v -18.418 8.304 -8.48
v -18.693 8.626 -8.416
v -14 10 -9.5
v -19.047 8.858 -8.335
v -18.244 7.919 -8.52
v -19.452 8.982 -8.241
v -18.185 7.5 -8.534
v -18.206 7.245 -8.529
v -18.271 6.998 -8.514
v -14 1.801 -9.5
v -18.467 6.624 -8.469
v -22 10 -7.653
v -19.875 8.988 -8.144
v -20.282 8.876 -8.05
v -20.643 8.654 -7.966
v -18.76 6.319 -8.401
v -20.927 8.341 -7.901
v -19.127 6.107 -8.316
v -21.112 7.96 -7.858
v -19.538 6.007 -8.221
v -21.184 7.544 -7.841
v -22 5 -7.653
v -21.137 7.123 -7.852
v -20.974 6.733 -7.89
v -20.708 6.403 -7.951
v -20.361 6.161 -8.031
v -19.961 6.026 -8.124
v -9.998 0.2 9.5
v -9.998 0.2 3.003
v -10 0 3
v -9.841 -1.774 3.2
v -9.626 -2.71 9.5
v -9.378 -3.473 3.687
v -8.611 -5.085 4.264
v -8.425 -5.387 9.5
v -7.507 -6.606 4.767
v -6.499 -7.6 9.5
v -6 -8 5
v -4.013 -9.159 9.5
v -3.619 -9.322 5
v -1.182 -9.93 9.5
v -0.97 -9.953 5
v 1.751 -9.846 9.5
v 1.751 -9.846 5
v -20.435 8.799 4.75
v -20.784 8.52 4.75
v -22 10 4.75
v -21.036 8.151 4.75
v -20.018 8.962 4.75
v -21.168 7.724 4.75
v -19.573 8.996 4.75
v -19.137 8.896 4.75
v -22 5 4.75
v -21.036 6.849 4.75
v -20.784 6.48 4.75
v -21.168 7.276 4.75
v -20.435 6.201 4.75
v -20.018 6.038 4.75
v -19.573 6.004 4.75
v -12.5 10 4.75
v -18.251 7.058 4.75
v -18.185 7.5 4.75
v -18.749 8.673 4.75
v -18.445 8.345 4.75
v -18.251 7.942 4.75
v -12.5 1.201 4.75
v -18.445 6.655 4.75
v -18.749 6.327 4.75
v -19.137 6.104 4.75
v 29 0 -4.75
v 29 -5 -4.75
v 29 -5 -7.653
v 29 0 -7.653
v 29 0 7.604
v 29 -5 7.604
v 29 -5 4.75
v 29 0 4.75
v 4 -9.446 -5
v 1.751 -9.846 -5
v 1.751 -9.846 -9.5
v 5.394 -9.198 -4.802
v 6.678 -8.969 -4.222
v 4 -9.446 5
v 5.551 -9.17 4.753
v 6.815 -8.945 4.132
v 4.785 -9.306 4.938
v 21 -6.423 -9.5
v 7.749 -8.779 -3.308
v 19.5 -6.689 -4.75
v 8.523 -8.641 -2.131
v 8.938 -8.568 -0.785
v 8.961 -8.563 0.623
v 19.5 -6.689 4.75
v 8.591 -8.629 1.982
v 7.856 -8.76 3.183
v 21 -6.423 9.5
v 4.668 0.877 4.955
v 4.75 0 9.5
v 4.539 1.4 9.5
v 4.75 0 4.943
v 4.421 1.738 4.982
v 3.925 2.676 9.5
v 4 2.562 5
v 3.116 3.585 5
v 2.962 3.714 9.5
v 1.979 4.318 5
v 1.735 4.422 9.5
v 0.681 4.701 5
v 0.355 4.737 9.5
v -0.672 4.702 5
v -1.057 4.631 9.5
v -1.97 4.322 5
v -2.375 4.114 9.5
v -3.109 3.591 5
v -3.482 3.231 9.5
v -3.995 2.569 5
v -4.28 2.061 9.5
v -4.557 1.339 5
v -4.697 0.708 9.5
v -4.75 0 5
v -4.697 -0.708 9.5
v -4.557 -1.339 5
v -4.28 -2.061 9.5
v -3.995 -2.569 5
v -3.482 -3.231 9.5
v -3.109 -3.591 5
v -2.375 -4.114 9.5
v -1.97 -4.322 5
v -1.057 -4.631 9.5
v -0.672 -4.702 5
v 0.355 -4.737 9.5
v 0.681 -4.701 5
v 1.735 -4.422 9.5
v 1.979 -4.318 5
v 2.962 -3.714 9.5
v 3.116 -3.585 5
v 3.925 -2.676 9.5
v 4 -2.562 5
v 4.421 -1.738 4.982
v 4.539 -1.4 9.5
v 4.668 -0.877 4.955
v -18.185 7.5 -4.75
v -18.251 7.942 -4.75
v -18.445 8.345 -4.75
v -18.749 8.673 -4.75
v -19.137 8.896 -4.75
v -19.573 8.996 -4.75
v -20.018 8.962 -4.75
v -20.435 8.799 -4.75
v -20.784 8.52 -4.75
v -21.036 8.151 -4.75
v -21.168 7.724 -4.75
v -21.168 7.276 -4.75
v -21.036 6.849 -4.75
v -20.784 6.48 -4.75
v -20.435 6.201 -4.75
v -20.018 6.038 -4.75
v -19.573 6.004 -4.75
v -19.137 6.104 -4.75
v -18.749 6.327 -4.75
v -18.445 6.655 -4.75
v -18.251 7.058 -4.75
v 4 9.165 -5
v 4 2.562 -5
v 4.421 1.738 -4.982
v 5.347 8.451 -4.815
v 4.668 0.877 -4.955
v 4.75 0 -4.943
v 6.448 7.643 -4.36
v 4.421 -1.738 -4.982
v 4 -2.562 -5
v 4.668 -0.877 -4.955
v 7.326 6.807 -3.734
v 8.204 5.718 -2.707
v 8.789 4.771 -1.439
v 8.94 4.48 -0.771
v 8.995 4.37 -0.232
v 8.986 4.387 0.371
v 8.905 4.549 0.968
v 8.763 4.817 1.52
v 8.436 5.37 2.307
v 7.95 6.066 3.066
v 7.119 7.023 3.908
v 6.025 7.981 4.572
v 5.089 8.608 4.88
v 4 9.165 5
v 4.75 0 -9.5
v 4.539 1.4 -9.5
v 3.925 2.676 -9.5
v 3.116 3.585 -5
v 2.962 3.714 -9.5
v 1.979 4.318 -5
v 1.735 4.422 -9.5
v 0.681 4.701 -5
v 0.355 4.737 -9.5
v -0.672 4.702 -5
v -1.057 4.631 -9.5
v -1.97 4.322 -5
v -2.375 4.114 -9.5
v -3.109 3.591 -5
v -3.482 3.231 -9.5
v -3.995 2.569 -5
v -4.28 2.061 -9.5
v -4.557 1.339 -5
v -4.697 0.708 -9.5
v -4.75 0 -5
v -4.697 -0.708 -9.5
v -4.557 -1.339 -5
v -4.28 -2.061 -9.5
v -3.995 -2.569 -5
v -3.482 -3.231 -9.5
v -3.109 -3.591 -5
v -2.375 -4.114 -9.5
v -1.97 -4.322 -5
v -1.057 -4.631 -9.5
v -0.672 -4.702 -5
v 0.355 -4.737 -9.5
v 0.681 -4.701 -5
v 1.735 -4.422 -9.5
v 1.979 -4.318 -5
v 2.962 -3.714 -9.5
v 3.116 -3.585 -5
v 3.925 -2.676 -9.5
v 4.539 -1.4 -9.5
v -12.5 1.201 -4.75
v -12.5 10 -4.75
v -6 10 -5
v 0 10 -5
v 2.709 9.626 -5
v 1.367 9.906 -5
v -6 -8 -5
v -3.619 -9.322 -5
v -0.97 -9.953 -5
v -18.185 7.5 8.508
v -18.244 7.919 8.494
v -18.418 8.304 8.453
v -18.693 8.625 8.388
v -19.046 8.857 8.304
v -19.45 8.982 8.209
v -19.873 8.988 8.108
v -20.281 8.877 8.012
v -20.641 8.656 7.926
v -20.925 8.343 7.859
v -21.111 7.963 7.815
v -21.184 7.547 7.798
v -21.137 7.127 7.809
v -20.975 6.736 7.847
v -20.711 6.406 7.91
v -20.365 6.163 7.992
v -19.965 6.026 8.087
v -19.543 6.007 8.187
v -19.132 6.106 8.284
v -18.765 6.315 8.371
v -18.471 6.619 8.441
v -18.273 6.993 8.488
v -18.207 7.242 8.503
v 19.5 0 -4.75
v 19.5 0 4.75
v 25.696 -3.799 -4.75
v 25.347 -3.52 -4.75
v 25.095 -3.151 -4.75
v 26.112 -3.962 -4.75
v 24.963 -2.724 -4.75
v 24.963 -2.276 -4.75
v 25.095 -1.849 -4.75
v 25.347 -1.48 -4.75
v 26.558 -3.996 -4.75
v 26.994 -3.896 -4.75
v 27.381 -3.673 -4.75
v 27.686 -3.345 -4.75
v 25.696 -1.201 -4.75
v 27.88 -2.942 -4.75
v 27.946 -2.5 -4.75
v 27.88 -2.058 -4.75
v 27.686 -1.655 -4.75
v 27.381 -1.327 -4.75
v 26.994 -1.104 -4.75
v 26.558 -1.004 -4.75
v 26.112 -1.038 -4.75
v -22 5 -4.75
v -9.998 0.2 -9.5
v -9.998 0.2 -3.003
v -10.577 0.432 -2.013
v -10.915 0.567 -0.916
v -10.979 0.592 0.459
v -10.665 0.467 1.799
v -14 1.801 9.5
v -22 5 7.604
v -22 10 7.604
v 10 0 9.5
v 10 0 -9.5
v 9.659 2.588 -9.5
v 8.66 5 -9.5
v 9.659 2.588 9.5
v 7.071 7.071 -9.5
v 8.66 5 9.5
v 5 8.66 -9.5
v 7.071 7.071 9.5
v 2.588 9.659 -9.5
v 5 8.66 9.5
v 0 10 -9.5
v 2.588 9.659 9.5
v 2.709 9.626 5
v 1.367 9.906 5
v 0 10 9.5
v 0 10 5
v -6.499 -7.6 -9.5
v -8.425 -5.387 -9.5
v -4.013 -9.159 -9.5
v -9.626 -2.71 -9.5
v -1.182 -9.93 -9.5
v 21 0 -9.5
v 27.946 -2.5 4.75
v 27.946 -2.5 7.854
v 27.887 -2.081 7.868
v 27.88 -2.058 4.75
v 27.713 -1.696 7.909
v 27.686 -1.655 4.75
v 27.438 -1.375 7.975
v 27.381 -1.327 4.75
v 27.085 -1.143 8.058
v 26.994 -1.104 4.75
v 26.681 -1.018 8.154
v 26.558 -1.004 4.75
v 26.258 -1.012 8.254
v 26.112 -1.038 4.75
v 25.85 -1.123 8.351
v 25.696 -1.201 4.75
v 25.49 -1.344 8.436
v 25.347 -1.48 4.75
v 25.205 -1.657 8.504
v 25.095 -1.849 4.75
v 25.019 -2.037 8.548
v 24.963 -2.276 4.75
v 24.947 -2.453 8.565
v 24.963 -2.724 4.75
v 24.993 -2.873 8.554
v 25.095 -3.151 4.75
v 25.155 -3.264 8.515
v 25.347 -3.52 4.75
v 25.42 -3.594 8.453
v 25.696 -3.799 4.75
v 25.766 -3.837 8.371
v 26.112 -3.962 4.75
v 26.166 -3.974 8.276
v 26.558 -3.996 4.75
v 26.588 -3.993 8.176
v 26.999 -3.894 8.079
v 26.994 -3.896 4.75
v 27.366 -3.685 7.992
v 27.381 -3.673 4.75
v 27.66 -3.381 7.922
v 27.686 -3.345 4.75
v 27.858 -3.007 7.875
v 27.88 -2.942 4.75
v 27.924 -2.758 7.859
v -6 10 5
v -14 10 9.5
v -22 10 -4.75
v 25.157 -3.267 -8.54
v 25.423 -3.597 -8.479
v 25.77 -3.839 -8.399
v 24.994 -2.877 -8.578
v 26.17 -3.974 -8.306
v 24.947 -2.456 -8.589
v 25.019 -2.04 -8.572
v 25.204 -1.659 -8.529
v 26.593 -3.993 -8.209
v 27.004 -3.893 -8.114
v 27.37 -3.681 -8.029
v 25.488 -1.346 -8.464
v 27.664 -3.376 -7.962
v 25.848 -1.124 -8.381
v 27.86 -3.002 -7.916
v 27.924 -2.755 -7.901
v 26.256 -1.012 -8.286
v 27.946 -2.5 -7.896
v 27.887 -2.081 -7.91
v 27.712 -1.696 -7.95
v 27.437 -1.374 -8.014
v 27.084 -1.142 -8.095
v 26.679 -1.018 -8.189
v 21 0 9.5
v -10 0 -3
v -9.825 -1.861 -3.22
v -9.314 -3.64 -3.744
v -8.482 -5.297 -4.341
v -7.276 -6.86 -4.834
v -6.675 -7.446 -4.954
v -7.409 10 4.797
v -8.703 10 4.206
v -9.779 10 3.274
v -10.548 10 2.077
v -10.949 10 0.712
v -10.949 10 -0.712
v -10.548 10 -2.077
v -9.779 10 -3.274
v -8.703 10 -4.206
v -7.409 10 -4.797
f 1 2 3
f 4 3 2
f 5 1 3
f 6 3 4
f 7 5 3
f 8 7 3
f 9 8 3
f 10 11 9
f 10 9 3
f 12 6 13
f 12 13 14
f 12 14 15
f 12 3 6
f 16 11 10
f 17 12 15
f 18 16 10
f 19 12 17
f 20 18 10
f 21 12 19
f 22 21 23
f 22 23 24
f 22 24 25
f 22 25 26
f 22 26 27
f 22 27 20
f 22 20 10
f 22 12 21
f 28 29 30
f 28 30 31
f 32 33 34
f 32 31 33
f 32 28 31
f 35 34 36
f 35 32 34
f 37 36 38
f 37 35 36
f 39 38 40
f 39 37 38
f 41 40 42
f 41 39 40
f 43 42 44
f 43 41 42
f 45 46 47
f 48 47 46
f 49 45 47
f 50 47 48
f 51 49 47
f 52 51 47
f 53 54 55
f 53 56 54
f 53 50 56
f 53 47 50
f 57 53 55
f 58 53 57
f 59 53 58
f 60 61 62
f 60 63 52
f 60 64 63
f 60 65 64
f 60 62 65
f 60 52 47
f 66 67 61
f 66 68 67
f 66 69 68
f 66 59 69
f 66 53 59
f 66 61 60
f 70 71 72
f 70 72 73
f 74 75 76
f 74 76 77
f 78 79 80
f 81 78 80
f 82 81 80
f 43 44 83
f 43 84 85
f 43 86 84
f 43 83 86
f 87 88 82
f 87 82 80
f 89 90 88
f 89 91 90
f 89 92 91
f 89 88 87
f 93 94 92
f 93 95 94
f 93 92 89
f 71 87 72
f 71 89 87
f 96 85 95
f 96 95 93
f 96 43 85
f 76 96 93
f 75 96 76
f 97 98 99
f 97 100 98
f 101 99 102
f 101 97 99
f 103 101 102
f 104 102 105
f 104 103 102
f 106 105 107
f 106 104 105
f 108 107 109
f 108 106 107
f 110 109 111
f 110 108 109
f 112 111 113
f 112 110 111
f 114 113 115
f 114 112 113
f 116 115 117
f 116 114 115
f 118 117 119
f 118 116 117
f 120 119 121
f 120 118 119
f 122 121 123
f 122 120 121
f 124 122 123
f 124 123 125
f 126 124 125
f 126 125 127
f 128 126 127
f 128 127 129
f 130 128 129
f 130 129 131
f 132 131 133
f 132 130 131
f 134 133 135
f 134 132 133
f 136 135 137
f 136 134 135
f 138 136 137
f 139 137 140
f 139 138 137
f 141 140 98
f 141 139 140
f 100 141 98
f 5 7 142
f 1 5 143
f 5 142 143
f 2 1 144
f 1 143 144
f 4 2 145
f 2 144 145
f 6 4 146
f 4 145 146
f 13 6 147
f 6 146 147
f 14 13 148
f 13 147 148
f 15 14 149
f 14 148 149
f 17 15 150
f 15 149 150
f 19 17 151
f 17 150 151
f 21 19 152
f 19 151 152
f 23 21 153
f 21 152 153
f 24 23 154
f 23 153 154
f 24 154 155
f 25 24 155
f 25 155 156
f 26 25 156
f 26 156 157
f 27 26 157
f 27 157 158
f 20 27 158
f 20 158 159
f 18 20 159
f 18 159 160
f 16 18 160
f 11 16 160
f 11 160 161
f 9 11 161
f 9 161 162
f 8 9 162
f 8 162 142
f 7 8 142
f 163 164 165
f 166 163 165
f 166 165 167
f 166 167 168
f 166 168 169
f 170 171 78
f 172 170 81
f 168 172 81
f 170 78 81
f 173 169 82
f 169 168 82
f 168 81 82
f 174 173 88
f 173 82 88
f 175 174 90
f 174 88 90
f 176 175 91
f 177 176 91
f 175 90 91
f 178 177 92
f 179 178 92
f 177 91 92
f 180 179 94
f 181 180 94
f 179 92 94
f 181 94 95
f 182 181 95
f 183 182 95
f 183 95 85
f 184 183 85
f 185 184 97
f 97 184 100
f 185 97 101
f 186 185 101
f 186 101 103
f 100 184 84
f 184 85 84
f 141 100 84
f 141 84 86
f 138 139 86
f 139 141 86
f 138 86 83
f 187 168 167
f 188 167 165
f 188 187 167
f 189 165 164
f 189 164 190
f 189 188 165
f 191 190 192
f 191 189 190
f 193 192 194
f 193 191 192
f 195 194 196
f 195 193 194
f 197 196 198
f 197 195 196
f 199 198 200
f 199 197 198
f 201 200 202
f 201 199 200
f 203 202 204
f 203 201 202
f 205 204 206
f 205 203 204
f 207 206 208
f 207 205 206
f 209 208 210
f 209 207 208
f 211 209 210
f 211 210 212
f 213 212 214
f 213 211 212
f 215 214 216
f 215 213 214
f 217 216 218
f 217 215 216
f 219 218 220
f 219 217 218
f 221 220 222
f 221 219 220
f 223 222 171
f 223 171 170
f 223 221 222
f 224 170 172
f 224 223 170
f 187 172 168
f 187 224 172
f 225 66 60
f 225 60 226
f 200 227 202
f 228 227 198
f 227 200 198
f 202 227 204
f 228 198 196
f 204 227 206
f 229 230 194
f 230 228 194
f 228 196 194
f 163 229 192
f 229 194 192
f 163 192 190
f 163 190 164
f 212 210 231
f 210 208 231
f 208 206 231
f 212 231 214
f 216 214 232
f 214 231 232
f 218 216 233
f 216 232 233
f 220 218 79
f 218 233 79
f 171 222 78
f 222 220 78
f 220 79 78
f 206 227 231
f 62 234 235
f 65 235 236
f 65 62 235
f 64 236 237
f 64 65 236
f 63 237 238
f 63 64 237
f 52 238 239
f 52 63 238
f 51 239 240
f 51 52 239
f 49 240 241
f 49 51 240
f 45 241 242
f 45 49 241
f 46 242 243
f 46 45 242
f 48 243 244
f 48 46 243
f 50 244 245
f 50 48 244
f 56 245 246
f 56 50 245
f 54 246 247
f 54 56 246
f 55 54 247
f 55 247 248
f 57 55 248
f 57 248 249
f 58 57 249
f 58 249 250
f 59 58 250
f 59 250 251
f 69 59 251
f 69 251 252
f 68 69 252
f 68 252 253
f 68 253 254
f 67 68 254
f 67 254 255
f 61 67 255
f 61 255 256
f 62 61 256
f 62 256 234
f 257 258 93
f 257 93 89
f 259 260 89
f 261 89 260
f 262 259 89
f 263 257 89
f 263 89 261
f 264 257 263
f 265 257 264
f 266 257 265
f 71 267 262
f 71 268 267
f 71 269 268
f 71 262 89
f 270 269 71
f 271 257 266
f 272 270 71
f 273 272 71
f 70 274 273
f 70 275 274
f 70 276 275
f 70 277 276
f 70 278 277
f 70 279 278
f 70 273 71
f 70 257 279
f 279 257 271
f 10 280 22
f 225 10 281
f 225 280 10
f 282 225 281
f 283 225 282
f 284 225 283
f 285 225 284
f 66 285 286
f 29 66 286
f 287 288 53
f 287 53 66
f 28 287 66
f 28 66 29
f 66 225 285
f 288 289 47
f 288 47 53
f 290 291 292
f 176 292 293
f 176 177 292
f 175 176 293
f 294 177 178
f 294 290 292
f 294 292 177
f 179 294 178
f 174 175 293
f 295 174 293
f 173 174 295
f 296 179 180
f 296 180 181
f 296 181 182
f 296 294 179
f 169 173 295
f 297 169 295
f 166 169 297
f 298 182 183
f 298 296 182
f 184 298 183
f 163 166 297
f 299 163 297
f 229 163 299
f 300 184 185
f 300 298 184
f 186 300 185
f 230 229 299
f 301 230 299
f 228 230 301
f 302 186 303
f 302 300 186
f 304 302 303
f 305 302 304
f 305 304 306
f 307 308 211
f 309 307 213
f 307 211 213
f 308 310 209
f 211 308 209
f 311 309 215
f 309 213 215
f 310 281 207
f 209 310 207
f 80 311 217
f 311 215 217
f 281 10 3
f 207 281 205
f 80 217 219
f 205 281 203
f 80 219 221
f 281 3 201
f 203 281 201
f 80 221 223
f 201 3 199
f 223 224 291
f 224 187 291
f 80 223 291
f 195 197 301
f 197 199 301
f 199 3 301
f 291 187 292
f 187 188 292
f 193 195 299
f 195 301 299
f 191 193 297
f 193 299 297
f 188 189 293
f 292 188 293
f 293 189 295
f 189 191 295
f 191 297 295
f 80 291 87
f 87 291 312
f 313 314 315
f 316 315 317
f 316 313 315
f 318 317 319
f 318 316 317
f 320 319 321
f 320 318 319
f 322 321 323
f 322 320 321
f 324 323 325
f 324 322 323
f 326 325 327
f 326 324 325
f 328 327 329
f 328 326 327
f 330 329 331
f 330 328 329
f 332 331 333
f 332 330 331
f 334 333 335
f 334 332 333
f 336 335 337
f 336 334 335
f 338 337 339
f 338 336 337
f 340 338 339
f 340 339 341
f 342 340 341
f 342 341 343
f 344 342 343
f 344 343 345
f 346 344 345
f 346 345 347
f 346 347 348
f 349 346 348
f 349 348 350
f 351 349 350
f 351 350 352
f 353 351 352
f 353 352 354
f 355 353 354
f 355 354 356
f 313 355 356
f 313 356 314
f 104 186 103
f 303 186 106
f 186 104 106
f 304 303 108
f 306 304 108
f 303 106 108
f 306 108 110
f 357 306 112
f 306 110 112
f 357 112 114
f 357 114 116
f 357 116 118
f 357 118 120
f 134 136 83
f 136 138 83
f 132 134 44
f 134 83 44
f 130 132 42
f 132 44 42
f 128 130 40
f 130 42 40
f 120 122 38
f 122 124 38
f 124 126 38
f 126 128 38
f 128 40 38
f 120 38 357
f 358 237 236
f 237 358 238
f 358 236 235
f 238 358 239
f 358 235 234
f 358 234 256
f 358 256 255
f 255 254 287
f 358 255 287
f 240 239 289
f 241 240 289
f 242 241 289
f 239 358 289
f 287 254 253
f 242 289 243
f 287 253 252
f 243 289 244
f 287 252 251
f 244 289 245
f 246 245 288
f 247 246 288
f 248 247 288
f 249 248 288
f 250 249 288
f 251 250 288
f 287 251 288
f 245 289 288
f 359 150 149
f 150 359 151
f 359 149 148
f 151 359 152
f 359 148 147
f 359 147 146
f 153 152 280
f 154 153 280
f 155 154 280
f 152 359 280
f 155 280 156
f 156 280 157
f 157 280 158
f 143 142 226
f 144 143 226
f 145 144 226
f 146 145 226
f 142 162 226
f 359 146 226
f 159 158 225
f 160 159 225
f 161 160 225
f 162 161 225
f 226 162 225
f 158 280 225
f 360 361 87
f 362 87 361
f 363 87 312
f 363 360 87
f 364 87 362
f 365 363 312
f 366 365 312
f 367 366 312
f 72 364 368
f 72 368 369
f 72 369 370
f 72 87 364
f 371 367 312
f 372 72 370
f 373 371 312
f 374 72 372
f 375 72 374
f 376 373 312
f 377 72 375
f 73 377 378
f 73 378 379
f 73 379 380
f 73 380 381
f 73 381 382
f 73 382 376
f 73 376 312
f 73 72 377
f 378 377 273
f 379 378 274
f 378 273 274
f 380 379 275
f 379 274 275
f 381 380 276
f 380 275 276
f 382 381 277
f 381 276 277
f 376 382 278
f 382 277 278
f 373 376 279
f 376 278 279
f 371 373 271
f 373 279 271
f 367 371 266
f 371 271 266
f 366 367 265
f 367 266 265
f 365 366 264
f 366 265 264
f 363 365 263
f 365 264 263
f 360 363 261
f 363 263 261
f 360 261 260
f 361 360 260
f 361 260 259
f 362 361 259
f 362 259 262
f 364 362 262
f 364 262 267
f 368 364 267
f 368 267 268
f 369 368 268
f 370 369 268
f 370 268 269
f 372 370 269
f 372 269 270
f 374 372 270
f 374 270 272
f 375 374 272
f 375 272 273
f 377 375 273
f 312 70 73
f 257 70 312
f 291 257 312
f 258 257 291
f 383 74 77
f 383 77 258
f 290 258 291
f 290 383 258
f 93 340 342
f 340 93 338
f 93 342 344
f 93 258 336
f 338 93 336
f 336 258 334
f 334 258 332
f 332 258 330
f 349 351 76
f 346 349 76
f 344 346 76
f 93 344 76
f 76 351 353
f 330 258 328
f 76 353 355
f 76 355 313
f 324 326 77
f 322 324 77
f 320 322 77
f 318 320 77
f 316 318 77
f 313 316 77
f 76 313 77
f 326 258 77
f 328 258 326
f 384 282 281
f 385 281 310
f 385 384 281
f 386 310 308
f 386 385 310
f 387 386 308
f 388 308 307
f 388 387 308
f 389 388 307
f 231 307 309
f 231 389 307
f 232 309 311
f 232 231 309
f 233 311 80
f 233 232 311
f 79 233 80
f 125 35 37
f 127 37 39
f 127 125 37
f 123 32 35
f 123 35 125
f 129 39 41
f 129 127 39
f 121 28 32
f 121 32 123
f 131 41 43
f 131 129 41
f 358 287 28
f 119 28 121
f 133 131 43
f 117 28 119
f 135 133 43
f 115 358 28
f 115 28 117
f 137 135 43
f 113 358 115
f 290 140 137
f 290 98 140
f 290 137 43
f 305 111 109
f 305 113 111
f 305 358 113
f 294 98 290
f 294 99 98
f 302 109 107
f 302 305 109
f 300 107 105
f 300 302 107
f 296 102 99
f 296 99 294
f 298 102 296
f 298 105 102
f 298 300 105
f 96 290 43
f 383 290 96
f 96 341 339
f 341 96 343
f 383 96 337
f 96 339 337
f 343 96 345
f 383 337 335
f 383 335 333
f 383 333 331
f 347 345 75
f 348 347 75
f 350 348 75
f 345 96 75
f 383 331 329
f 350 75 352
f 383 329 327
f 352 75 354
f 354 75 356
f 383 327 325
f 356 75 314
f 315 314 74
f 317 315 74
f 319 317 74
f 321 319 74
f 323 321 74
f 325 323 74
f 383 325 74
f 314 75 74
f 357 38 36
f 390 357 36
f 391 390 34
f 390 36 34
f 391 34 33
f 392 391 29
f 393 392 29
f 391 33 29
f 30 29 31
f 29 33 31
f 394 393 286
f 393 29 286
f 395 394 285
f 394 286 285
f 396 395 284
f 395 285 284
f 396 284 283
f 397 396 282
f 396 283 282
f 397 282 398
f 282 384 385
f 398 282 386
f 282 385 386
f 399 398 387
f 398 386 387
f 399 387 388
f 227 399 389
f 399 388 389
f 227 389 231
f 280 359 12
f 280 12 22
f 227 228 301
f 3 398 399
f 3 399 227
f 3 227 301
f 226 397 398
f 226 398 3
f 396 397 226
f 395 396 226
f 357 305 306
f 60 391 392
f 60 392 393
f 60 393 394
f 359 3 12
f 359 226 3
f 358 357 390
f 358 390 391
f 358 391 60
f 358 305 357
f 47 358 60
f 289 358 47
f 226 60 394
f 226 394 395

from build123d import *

# Parameters (mm, degrees)
SKETCH1_R               = 4.75
BOSS_EXTRUDE1_DEPTH     = 9.5
SKETCH2_W               = 19
SKETCH2_H               = 9.5
CUT_EXTRUDE1_DEPTH      = 11
CUT_EXTRUDE1_DEPTH_BACK = 11
CHAMFER1_SIZE           = 8
CHAMFER1_SIZE2          = 1.895543273
CHAMFER2_SIZE           = 8
CHAMFER2_SIZE2          = 1.846945529
SKETCH5_R               = 1.5
CUT_EXTRUDE2_DEPTH      = 10.5000001
CUT_EXTRUDE2_DEPTH_BACK = 10.5000001


with BuildPart() as part:
    # Sketch1 → Boss-Extrude1 (new body, symmetric)
    with BuildSketch(Plane.XY):
        with BuildLine():
            Line((0, 10), (-22, 10))
            Line((-22, 10), (-22, 5))
            Line((-22, 5), (-9.9979998, 0.2))
            ThreePointArc((-9.9979998, 0.2), (-6.49865122, -7.600495531), (1.750767609, -9.845547866))
            Line((1.750767609, -9.845547866), (29, -5))
            Line((29, -5), (29, 0))
            Line((29, 0), (10, 0))
            ThreePointArc((10, 0), (7.071067812, 7.071067812), (0, 10))
        make_face()
        Circle(SKETCH1_R, mode=Mode.SUBTRACT)
    extrude(amount=BOSS_EXTRUDE1_DEPTH, both=True)

    # Sketch2 → Cut-Extrude1 (cut, two sides)
    with BuildSketch(Plane(origin=(0, 0, 0), x_dir=(1, 0, 0), z_dir=(0, 1, 0))) as cut_extrude1_sk:
        with Locations((-22, 0)):
            Rectangle(SKETCH2_W, SKETCH2_H)
        with Locations((29, 0)):
            Rectangle(SKETCH2_W, SKETCH2_H)
        with BuildLine():
            Line((-6, 5), (4, 5))
            ThreePointArc((4, 5), (9, 0), (4, -5))
            Line((4, -5), (-6, -5))
            ThreePointArc((-6, -5), (-11, 0), (-6, 5))
        make_face()
    extrude(amount=CUT_EXTRUDE1_DEPTH, mode=Mode.SUBTRACT)
    extrude(cut_extrude1_sk.sketch, amount=-CUT_EXTRUDE1_DEPTH_BACK, mode=Mode.SUBTRACT)

    # Chamfer1
    chamfer1_edges = [part.edges().sort_by_distance(p)[0] for p in [
        (-22, 7.5, 9.5),
        (29, -2.5, 9.5),
    ]]
    chamfer1_side = [part.faces().sort_by_distance(p)[0] for p in [
        (6.683704933, 6.683704933, 9.5),
    ]]
    chamfer(chamfer1_edges, length=CHAMFER1_SIZE, length2=CHAMFER1_SIZE2, reference=chamfer1_side[0])

    # Chamfer2
    chamfer2_edges = [part.edges().sort_by_distance(p)[0] for p in [
        (-22, 7.5, -9.5),
        (29, -2.5, -9.5),
    ]]
    chamfer2_side = [part.faces().sort_by_distance(p)[0] for p in [
        (6.683704933, 6.683704933, -9.5),
    ]]
    chamfer(chamfer2_edges, length=CHAMFER2_SIZE, length2=CHAMFER2_SIZE2, reference=chamfer2_side[0])

    # Sketch5 → Cut-Extrude2 (cut, two sides)
    with BuildSketch(Plane.XY) as cut_extrude2_sk:
        with Locations((-19.684598733, 7.5)):
            Circle(SKETCH5_R)
        with Locations((26.44619669, -2.5)):
            Circle(SKETCH5_R)
    extrude(amount=CUT_EXTRUDE2_DEPTH, mode=Mode.SUBTRACT)
    extrude(cut_extrude2_sk.sketch, amount=-CUT_EXTRUDE2_DEPTH_BACK, mode=Mode.SUBTRACT)


solid = part.part
